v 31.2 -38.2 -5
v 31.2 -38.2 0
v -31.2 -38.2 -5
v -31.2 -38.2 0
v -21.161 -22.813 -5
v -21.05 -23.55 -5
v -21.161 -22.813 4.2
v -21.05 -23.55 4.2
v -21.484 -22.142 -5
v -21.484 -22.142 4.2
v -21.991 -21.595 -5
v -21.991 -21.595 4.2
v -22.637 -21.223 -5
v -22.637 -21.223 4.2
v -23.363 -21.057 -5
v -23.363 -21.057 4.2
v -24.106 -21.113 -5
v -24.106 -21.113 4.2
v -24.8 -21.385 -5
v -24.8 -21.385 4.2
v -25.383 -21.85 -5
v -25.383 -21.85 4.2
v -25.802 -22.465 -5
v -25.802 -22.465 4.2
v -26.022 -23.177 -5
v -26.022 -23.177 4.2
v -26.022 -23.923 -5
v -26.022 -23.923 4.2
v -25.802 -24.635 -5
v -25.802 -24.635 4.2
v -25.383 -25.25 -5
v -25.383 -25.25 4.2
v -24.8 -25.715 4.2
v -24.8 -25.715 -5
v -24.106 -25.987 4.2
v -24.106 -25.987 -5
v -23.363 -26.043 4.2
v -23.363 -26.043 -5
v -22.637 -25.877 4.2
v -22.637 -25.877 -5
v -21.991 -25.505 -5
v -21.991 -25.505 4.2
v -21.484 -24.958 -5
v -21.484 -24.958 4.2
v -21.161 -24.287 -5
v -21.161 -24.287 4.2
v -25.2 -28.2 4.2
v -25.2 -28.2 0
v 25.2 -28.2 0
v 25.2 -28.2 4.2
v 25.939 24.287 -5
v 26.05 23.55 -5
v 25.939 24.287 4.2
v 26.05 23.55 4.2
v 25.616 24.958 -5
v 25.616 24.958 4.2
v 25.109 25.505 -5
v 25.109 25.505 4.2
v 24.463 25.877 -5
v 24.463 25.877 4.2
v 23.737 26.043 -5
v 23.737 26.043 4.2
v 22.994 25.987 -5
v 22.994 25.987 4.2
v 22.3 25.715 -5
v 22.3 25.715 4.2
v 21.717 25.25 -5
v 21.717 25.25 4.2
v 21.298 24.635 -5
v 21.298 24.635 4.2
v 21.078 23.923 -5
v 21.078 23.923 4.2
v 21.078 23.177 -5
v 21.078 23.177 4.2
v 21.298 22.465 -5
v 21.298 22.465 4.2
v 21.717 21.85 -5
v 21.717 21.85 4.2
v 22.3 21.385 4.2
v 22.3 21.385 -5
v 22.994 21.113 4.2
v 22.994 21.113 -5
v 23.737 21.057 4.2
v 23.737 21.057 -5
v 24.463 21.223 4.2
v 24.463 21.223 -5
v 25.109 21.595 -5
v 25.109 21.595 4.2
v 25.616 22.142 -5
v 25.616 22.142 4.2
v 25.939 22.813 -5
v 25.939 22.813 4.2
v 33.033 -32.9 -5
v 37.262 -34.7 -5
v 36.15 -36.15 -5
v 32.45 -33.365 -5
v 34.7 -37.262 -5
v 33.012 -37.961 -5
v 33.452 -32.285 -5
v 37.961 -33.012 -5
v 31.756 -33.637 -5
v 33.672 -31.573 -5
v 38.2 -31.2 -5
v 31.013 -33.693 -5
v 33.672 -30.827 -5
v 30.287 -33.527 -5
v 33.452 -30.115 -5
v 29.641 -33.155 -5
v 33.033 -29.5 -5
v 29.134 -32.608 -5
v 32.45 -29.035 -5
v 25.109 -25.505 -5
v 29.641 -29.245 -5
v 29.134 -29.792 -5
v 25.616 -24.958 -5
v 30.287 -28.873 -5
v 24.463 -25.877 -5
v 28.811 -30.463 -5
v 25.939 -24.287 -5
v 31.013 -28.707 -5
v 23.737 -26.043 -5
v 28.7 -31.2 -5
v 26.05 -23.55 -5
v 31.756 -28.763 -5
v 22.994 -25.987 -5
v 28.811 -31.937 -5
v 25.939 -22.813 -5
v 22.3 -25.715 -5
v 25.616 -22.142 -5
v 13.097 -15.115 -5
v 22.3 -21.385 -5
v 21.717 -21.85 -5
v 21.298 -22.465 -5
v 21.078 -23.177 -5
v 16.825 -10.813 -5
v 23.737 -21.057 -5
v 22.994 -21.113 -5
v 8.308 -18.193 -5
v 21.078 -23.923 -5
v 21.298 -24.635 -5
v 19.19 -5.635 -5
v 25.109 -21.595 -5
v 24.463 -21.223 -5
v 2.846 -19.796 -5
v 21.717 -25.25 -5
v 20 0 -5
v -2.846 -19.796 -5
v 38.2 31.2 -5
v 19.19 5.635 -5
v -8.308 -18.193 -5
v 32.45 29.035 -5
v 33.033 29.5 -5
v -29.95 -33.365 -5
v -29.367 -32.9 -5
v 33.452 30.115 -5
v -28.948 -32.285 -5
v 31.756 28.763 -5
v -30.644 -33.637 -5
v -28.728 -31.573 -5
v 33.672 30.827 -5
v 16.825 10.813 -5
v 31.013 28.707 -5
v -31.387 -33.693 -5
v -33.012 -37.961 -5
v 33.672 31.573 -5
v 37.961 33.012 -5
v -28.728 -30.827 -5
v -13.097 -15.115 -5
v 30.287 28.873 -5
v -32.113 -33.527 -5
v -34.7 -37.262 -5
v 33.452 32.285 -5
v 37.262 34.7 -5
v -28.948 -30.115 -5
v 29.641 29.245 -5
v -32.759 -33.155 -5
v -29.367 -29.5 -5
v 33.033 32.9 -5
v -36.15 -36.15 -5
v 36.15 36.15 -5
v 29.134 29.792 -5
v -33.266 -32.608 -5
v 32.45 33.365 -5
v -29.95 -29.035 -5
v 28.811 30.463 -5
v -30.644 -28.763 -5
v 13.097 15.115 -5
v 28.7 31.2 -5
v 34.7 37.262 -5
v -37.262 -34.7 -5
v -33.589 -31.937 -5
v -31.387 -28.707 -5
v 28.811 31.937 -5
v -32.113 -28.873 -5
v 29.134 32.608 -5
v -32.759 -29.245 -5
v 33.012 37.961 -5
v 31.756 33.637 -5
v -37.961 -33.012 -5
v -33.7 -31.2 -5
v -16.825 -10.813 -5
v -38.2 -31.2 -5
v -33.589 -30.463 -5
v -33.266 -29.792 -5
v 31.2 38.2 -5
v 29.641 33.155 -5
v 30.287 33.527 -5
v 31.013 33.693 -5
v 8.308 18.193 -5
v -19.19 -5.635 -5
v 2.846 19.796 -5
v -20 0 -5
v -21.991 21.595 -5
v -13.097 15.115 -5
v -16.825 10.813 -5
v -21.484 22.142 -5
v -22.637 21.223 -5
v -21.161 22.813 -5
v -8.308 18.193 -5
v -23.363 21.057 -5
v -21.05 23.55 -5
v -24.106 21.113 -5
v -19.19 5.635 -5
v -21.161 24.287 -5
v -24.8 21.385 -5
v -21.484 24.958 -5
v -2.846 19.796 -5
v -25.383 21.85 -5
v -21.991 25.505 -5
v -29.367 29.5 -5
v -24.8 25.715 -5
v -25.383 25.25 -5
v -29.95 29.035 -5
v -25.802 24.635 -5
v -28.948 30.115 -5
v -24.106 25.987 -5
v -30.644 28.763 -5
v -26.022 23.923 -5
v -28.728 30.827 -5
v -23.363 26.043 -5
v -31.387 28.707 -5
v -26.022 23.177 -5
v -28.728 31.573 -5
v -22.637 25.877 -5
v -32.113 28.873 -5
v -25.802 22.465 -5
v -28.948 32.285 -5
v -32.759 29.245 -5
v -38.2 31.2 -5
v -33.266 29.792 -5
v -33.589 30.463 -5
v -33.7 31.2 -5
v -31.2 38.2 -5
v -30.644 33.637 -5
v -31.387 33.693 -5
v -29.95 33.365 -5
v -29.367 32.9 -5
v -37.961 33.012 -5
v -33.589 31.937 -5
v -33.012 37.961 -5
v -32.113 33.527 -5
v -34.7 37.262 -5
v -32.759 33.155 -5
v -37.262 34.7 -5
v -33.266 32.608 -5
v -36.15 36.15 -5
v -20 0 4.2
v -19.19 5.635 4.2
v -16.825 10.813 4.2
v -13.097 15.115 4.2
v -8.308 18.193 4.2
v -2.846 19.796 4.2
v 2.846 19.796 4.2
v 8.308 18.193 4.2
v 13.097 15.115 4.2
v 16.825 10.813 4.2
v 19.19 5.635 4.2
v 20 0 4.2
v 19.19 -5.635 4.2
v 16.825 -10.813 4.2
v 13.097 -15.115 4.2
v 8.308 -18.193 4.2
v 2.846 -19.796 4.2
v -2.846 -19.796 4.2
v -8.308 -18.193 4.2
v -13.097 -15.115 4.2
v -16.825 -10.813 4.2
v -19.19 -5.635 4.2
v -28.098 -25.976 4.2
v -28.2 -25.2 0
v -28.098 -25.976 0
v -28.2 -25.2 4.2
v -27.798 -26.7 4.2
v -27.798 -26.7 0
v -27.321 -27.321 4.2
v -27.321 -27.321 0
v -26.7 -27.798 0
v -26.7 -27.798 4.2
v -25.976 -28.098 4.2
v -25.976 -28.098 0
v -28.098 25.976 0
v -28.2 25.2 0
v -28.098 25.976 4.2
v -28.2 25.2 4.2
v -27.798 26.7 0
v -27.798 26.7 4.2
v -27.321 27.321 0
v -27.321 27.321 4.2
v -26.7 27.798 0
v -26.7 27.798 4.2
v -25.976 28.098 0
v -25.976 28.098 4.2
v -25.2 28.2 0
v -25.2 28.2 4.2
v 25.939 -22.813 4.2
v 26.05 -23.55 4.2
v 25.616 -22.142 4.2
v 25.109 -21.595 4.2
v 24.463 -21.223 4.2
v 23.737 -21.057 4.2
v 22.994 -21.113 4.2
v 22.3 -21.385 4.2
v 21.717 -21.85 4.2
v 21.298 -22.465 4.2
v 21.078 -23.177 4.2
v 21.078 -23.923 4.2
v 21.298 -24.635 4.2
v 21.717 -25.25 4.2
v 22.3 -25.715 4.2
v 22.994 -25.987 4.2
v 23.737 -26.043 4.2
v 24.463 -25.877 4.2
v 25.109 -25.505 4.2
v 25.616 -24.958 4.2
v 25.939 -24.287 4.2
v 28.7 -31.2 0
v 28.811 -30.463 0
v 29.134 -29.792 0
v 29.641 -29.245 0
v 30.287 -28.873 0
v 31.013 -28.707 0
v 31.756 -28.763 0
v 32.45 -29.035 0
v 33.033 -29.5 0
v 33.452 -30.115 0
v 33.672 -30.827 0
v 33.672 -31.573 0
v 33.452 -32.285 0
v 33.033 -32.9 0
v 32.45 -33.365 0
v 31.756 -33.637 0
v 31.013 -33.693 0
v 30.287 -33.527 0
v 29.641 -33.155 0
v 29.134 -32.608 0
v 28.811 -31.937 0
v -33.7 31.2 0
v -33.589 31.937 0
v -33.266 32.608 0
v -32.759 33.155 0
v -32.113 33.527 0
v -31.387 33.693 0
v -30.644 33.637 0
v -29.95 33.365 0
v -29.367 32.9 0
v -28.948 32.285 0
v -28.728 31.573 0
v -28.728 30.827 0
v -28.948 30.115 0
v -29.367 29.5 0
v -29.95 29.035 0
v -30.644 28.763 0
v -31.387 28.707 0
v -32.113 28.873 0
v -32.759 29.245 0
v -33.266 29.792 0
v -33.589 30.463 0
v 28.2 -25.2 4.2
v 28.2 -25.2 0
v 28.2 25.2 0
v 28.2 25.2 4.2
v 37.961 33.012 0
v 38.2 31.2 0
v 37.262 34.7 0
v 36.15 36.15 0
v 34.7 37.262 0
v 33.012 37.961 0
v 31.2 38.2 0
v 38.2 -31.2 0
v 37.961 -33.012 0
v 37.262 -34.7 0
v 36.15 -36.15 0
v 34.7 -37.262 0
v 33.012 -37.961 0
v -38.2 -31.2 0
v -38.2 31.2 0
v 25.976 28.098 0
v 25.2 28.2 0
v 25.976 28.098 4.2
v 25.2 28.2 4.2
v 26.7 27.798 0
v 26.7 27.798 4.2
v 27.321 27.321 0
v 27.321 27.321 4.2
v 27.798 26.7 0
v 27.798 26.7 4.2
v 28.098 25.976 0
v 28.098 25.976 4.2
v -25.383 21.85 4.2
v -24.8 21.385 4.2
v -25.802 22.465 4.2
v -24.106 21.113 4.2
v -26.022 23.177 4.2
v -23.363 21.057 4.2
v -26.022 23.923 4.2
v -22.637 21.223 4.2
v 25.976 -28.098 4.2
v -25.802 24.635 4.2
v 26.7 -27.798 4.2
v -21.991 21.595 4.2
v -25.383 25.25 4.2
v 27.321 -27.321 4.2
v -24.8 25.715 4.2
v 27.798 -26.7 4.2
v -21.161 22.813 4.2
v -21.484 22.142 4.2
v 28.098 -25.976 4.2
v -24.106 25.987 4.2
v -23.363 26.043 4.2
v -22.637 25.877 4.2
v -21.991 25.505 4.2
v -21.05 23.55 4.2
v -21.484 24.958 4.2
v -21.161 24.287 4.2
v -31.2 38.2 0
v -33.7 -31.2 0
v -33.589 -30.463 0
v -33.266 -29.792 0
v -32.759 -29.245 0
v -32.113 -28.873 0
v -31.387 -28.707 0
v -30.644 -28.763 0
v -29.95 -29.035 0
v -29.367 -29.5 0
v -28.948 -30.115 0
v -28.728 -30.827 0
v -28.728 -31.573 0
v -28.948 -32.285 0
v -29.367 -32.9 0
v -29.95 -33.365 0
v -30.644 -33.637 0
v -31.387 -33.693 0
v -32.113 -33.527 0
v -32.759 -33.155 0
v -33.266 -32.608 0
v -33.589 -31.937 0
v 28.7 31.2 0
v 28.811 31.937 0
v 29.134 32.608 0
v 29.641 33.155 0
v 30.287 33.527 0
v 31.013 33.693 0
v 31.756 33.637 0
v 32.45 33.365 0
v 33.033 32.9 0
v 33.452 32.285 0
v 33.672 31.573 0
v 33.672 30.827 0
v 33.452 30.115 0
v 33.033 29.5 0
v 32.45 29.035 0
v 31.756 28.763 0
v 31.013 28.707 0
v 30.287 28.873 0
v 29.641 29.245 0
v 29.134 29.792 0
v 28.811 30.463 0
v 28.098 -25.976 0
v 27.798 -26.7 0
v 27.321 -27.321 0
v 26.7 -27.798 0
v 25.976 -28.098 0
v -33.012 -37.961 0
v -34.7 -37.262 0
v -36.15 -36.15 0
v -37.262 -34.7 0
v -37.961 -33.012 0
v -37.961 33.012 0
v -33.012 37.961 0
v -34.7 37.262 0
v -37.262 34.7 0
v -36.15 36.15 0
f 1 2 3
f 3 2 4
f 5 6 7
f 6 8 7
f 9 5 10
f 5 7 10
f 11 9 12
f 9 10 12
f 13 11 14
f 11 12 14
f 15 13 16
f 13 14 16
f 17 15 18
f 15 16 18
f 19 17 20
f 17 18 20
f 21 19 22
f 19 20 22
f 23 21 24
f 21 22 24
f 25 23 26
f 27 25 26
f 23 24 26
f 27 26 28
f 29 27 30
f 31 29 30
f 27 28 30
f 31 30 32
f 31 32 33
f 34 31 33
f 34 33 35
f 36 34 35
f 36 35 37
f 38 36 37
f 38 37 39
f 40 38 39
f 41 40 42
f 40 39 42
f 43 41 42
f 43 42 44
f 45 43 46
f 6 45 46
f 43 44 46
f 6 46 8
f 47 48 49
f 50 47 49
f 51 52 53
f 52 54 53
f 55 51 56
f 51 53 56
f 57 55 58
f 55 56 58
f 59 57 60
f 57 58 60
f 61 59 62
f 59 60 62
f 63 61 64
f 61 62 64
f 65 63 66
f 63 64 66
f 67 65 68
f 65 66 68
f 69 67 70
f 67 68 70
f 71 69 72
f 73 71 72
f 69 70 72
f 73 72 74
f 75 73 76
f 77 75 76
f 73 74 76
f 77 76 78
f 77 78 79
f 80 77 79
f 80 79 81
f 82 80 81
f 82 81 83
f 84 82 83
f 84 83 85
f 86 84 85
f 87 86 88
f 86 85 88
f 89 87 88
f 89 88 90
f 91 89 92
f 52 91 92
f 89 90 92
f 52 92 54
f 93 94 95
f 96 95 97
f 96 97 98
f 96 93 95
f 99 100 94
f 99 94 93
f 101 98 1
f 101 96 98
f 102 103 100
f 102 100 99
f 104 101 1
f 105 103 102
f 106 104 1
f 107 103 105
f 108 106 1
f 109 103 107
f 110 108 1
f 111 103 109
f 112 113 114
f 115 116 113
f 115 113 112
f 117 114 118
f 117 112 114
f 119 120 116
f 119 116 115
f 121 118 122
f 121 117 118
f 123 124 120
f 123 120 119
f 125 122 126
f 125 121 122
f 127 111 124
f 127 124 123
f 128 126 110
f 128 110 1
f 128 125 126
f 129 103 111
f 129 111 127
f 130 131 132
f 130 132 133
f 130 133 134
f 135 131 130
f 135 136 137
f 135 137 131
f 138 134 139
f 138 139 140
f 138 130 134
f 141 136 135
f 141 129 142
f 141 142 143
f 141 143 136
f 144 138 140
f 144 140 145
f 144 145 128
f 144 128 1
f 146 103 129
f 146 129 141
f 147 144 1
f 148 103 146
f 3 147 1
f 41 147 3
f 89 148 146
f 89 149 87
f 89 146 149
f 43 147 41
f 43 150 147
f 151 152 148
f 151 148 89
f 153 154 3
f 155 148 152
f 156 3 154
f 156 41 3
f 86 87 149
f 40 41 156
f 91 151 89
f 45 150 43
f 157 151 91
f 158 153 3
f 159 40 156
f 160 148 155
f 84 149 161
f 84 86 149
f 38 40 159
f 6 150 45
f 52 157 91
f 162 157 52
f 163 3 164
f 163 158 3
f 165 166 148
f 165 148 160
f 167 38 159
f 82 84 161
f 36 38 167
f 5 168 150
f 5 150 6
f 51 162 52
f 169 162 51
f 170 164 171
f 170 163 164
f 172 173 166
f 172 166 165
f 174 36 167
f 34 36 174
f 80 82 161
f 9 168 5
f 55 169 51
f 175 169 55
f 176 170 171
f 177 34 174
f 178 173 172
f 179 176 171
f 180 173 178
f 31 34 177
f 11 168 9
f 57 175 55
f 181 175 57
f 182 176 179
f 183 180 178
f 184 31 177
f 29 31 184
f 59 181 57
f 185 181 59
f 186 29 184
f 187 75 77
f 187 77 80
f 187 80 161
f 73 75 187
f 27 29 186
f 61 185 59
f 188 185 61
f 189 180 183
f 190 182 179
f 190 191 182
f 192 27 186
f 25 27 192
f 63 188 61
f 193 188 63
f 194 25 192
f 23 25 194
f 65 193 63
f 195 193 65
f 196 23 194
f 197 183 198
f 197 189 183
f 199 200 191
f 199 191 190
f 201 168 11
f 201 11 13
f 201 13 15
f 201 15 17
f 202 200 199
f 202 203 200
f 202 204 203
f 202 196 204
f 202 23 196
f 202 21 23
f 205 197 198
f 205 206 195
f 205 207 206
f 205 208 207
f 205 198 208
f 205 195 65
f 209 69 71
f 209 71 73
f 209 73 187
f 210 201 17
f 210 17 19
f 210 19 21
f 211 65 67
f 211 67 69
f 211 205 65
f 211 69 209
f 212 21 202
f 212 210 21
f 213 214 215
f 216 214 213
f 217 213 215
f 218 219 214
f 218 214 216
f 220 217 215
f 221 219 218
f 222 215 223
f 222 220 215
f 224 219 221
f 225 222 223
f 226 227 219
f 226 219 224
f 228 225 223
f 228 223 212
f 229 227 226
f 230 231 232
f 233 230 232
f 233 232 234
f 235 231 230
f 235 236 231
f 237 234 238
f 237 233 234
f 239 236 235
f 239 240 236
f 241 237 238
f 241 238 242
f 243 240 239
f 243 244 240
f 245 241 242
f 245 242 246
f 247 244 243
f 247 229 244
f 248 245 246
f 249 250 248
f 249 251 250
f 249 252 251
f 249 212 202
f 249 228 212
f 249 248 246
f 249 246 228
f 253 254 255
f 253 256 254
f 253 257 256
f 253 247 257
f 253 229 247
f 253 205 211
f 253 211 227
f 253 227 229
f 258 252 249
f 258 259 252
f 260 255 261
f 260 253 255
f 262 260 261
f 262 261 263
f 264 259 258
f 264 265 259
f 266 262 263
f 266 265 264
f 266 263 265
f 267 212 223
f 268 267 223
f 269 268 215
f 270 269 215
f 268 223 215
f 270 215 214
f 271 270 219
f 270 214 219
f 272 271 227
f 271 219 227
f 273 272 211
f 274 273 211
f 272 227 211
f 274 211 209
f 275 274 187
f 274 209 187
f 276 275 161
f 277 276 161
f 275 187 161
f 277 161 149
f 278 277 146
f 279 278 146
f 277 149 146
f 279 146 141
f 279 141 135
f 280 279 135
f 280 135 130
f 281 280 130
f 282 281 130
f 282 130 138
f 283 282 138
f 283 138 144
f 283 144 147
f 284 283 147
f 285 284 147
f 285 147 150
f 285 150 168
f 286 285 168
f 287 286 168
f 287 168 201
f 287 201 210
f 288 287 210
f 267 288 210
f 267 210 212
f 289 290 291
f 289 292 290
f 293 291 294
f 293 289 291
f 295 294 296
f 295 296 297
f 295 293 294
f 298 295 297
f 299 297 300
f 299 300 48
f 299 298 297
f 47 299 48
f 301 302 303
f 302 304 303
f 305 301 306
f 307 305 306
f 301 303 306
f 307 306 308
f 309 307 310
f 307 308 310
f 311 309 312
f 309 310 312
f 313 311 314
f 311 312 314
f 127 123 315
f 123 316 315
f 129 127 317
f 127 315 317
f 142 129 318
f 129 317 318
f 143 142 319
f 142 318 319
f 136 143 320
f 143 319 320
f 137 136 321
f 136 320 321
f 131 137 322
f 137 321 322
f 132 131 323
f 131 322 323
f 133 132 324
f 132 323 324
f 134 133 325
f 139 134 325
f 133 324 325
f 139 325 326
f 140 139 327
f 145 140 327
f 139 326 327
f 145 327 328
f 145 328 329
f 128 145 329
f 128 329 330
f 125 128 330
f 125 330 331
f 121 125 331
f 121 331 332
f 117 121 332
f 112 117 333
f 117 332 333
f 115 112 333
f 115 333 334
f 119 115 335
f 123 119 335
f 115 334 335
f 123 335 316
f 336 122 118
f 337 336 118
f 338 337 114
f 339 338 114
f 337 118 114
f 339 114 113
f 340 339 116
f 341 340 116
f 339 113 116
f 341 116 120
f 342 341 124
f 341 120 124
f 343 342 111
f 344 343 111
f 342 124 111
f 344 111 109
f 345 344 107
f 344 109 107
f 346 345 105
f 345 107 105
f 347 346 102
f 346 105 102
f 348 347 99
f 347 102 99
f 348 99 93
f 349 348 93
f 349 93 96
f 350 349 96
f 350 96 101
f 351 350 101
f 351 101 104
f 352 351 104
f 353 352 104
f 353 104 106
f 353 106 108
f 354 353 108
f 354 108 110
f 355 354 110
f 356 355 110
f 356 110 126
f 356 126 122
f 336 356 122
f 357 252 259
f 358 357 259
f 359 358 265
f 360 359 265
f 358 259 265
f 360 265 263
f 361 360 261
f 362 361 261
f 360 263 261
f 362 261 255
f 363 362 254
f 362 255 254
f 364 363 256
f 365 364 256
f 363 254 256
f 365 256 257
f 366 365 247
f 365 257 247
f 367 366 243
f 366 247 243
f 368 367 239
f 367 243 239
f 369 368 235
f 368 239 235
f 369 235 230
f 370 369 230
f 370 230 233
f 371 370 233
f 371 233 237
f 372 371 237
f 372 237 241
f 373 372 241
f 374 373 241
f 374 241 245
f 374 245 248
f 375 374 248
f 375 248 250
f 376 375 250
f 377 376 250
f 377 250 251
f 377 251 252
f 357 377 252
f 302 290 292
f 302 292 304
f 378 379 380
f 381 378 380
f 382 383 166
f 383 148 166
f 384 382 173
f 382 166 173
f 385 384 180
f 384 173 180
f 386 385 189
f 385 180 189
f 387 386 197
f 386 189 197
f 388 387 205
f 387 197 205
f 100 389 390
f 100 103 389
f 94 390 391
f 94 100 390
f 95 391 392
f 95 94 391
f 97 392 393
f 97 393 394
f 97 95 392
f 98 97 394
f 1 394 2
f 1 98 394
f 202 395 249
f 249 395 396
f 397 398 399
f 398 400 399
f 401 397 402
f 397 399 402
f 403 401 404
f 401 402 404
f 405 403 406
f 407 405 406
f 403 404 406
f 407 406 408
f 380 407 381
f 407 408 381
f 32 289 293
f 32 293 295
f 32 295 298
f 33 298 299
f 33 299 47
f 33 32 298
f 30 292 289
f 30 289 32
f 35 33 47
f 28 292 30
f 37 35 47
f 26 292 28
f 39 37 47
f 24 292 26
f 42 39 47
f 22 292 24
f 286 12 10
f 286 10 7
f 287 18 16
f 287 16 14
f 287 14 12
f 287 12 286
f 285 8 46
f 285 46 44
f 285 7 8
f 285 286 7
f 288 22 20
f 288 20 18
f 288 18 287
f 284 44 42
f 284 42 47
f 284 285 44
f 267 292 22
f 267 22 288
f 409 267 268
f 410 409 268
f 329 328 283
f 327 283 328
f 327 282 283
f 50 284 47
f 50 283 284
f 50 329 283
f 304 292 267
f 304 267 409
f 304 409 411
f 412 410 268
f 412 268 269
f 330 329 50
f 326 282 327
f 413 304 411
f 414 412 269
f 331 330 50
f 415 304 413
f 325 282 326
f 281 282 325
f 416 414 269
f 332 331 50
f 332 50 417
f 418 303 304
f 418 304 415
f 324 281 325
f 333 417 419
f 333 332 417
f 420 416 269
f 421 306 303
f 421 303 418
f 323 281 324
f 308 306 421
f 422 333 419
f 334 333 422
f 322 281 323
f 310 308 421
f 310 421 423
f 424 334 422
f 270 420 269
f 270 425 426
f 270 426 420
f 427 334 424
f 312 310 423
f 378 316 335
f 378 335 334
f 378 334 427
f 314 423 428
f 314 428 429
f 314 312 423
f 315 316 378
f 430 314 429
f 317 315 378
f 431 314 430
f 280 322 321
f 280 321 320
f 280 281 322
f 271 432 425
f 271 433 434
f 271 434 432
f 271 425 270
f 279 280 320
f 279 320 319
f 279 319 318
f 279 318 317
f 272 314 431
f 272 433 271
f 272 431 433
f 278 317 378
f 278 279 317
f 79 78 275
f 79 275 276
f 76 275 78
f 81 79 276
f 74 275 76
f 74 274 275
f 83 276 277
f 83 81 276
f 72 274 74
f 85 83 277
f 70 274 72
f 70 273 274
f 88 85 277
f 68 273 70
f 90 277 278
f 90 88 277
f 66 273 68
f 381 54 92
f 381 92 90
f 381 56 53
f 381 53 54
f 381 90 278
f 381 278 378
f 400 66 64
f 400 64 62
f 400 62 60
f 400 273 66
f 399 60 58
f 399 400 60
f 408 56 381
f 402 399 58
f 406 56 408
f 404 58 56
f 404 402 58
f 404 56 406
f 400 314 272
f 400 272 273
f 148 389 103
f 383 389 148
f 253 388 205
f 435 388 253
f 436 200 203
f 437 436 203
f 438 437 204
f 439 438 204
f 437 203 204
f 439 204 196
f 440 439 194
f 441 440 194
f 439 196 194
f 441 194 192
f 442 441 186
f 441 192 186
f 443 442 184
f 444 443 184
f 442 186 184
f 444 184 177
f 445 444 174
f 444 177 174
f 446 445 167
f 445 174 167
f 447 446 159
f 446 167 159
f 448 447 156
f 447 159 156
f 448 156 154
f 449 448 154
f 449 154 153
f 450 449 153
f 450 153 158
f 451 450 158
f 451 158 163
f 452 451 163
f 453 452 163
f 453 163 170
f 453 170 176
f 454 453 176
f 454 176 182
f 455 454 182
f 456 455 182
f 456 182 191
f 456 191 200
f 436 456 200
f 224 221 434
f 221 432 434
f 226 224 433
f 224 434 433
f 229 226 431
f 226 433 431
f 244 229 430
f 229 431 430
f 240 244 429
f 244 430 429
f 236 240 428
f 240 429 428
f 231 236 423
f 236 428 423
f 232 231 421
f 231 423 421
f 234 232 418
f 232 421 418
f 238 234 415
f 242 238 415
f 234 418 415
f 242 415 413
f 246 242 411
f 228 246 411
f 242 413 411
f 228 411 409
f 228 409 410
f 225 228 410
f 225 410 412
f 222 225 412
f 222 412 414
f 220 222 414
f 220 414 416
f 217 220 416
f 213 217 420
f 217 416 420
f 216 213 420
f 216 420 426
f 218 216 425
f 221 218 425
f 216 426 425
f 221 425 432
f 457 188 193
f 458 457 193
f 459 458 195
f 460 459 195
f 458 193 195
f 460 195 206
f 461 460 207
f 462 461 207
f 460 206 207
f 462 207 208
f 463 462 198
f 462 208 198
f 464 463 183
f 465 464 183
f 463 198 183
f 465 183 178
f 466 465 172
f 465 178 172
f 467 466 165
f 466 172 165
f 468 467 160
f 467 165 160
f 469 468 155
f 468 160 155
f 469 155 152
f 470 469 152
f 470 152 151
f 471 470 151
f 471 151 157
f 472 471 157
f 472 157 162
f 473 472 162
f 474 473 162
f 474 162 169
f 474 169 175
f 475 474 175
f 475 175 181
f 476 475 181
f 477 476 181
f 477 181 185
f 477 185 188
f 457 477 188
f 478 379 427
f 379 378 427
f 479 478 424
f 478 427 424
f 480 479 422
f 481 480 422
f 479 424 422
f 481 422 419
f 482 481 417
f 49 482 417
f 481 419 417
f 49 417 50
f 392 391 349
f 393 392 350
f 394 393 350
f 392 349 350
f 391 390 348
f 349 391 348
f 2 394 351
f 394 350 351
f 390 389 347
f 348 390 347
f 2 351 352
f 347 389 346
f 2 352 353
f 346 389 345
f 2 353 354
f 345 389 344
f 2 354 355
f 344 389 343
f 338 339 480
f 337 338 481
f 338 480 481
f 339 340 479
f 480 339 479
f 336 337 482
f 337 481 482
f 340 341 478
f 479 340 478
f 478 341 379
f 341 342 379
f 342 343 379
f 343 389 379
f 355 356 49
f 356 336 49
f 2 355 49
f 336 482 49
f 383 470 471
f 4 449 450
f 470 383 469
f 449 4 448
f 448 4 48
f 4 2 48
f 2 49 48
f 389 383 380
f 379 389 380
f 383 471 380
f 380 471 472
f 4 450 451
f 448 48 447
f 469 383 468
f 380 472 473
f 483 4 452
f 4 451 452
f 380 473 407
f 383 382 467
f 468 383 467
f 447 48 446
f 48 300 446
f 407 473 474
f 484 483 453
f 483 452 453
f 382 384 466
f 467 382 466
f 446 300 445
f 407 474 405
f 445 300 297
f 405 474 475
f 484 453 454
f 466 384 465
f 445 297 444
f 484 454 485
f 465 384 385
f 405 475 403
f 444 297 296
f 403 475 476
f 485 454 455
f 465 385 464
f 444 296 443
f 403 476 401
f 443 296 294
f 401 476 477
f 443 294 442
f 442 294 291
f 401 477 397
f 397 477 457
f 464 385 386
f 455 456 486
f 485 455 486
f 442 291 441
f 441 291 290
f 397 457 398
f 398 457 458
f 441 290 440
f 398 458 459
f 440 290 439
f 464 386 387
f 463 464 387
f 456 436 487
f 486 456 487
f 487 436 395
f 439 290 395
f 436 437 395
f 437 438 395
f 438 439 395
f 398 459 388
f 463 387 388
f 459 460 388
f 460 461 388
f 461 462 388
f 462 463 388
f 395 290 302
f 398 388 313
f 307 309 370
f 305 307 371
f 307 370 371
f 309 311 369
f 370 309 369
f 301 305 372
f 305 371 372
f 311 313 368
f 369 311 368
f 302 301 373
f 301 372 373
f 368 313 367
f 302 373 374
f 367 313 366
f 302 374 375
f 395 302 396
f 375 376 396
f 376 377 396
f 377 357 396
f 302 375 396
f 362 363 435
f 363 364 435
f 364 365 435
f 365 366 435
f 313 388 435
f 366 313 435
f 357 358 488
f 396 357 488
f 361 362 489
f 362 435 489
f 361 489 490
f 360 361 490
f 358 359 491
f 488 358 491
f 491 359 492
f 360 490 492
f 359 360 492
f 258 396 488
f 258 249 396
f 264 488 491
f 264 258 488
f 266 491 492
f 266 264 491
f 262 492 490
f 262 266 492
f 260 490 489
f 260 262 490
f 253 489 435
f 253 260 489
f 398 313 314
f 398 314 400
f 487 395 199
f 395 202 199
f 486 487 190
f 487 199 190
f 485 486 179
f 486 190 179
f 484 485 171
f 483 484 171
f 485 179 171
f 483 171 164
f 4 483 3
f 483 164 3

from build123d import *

# Parameters (mm, degrees)
SKETCH1_W               = 56.4
SKETCH1_H               = 56.4
BOSS_EXTRUDE1_DEPTH     = 4.2
SKETCH2_R               = 19.15
CUT_EXTRUDE1_DEPTH      = 1.6
SKETCH4_W               = 76.4
SKETCH4_H               = 76.4
BOSS_EXTRUDE2_DEPTH     = 5
SKETCH3_R               = 10
SKETCH3_R_2             = 2.5
CUT_EXTRUDE2_DEPTH      = 2.6
CUT_EXTRUDE2_DEPTH_BACK = 8.6
FILLET1_R               = 7
FILLET2_R               = 3
SKETCH5_R               = 2.5
CUT_EXTRUDE4_DEPTH      = 10
SKETCH6_R               = 20
CUT_EXTRUDE5_DEPTH      = 10


with BuildPart() as part:
    # Sketch1 → Boss-Extrude1 (new body)
    with BuildSketch(Plane.XY):
        Rectangle(SKETCH1_W, SKETCH1_H)
    extrude(amount=BOSS_EXTRUDE1_DEPTH)

    # Sketch2 → Cut-Extrude1 (cut)
    with BuildSketch(Plane.XY.offset(4.2)):
        Circle(SKETCH2_R)
    extrude(amount=-CUT_EXTRUDE1_DEPTH, mode=Mode.SUBTRACT)

    # Sketch4 → Boss-Extrude2 (add)
    with BuildSketch(Plane(origin=(0, 0, 0), x_dir=(-1, 0, 0), z_dir=(0, 0, -1))):
        Rectangle(SKETCH4_W, SKETCH4_H)
    extrude(amount=BOSS_EXTRUDE2_DEPTH)

    # Sketch3 → Cut-Extrude2 (cut, two sides)
    with BuildSketch(Plane.XY.offset(2.6)) as cut_extrude2_sk:
        Circle(SKETCH3_R)
        with Locations((23.55, -23.55)):
            Circle(SKETCH3_R_2)
        with Locations((-23.55, -23.55)):
            Circle(SKETCH3_R_2)
        with Locations((-23.55, 23.55)):
            Circle(SKETCH3_R_2)
        with Locations((23.55, 23.55)):
            Circle(SKETCH3_R_2)
    extrude(amount=CUT_EXTRUDE2_DEPTH, mode=Mode.SUBTRACT)
    extrude(cut_extrude2_sk.sketch, amount=-CUT_EXTRUDE2_DEPTH_BACK, mode=Mode.SUBTRACT)

    # Fillet1
    fillet1_edges = [part.edges().sort_by_distance(p)[0] for p in [
        (38.2, 38.2, -2.5),
        (38.2, -38.2, -2.5),
        (-38.2, -38.2, -2.5),
        (-38.2, 38.2, -2.5),
    ]]
    fillet(fillet1_edges, radius=FILLET1_R)

    # Fillet2
    fillet2_edges = [part.edges().sort_by_distance(p)[0] for p in [
        (28.2, -28.2, 2.1),
        (-28.2, -28.2, 2.1),
        (-28.2, 28.2, 2.1),
        (28.2, 28.2, 2.1),
    ]]
    fillet(fillet2_edges, radius=FILLET2_R)

    # Sketch5 → Cut-Extrude4 (cut)
    with BuildSketch(Plane(origin=(0, 0, -5), x_dir=(-1, 0, 0), z_dir=(0, 0, -1))):
        with Locations((-31.2, -31.2)):
            Circle(SKETCH5_R)
        with Locations((-31.2, 31.2)):
            Circle(SKETCH5_R)
        with Locations((31.2, 31.2)):
            Circle(SKETCH5_R)
        with Locations((31.2, -31.2)):
            Circle(SKETCH5_R)
    extrude(amount=-CUT_EXTRUDE4_DEPTH, mode=Mode.SUBTRACT)

    # Sketch6 → Cut-Extrude5 (cut)
    with BuildSketch(Plane(origin=(0, 0, -5), x_dir=(-1, 0, 0), z_dir=(0, 0, -1))):
        Circle(SKETCH6_R)
    extrude(amount=-CUT_EXTRUDE5_DEPTH, mode=Mode.SUBTRACT)


solid = part.part
